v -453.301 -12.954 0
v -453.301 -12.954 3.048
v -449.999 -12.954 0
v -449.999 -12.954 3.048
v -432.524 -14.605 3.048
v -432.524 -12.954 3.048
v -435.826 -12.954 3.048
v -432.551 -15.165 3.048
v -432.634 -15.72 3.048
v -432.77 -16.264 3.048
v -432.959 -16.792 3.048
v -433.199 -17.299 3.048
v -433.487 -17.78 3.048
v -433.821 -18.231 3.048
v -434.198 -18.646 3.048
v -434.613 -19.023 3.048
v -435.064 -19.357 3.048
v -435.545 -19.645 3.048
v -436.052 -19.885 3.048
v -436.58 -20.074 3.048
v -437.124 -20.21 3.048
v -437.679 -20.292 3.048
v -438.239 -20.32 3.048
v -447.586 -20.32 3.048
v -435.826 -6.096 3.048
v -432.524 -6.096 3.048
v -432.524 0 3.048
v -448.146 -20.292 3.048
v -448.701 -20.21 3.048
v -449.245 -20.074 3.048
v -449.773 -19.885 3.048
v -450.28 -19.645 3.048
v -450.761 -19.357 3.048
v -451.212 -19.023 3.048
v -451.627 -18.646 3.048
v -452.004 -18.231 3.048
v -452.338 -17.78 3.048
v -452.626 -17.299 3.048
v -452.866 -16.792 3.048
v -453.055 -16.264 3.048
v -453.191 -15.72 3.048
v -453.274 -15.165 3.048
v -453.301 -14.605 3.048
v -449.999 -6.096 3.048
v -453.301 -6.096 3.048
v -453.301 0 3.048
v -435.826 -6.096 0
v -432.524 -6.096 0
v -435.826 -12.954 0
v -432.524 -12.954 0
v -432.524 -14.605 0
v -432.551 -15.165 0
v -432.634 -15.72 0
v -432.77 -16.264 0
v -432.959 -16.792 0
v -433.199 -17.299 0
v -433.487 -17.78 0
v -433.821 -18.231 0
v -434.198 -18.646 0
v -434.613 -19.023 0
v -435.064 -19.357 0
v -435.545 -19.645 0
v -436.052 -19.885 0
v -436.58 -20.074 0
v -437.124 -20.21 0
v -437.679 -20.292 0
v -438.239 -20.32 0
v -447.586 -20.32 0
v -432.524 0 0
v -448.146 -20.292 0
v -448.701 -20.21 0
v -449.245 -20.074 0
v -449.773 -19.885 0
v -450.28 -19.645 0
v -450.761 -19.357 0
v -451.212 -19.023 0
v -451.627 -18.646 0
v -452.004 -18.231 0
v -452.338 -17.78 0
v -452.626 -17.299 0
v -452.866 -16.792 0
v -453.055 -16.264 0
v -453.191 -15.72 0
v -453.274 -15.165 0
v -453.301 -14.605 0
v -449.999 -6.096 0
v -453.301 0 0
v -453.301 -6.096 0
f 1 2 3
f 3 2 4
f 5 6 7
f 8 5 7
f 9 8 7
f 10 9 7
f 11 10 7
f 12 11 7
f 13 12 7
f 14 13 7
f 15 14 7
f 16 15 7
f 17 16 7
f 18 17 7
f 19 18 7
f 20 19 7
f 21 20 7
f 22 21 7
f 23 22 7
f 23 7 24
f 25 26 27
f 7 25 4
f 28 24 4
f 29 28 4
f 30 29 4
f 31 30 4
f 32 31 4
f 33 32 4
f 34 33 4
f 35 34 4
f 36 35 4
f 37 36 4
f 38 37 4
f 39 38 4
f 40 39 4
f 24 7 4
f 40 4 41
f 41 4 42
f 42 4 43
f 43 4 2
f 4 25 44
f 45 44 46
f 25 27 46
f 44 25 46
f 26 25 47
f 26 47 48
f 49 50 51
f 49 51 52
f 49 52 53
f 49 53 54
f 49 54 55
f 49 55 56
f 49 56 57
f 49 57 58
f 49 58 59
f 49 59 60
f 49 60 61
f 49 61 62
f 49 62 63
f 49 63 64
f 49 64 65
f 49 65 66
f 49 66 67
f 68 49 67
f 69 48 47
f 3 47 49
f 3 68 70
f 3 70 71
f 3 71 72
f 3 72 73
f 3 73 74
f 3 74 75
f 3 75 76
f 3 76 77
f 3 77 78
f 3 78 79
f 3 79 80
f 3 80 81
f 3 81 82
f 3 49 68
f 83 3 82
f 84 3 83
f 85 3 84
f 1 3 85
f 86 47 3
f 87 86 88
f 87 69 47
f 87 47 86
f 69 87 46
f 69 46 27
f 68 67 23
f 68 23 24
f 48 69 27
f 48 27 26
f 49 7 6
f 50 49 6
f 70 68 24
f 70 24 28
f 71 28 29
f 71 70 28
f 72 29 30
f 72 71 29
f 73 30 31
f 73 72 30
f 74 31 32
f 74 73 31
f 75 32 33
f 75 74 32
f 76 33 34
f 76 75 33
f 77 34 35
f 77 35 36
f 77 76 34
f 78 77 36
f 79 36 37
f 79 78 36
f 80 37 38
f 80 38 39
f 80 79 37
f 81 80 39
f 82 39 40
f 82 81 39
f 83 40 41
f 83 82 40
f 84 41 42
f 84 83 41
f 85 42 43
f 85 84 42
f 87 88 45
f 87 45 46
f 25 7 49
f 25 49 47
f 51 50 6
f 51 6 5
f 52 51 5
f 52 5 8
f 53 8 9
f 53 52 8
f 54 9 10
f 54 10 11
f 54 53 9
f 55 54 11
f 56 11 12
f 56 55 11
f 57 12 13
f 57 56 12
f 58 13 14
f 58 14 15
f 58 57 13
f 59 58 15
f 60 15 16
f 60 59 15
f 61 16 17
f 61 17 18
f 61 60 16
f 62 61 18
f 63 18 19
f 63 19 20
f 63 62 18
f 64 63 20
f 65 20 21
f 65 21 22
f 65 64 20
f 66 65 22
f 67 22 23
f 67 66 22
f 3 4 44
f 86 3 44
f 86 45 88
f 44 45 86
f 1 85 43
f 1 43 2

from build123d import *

# Parameters (mm, degrees)
BOSS_EXTRUDE1_DEPTH = 3.048
SKETCH2_W           = 3.556
SKETCH2_H           = 6.858
CUT_EXTRUDE1_DEPTH  = 454.766547869


with BuildPart() as part:
    # Sketch1 → Boss-Extrude1 (new body)
    with BuildSketch(Plane.XY):
        with BuildLine():
            Line((-435.5719, 0), (-432.5239, 0))
            Line((-432.5239, 0), (-432.5239, -6.35))
            Line((-432.5239, -6.35), (-432.5239, -12.7))
            Line((-432.5239, -12.7), (-432.5239, -14.605))
            ThreePointArc((-432.5239, -14.605), (-434.197784746, -18.646115254), (-438.2389, -20.32))
            Line((-438.2389, -20.32), (-447.5861, -20.32))
            ThreePointArc((-447.5861, -20.32), (-451.627215254, -18.646115254), (-453.3011, -14.605))
            Line((-453.3011, -14.605), (-453.3011, -12.7))
            Line((-453.3011, -12.7), (-453.3011, -6.35))
            Line((-453.3011, -6.35), (-453.3011, 0))
            Line((-453.3011, 0), (-450.2531, 0))
            Line((-450.2531, 0), (-435.5719, 0))
        make_face()
    extrude(amount=BOSS_EXTRUDE1_DEPTH)

    # Sketch2 → Cut-Extrude1 (cut, through all)
    with BuildSketch(Plane.XY.offset(3.048)):
        with Locations((-434.0479, -9.525)):
            Rectangle(SKETCH2_W, SKETCH2_H)
        with Locations((-451.7771, -9.525)):
            Rectangle(SKETCH2_W, SKETCH2_H)
    extrude(amount=-CUT_EXTRUDE1_DEPTH, mode=Mode.SUBTRACT)


solid = part.part
